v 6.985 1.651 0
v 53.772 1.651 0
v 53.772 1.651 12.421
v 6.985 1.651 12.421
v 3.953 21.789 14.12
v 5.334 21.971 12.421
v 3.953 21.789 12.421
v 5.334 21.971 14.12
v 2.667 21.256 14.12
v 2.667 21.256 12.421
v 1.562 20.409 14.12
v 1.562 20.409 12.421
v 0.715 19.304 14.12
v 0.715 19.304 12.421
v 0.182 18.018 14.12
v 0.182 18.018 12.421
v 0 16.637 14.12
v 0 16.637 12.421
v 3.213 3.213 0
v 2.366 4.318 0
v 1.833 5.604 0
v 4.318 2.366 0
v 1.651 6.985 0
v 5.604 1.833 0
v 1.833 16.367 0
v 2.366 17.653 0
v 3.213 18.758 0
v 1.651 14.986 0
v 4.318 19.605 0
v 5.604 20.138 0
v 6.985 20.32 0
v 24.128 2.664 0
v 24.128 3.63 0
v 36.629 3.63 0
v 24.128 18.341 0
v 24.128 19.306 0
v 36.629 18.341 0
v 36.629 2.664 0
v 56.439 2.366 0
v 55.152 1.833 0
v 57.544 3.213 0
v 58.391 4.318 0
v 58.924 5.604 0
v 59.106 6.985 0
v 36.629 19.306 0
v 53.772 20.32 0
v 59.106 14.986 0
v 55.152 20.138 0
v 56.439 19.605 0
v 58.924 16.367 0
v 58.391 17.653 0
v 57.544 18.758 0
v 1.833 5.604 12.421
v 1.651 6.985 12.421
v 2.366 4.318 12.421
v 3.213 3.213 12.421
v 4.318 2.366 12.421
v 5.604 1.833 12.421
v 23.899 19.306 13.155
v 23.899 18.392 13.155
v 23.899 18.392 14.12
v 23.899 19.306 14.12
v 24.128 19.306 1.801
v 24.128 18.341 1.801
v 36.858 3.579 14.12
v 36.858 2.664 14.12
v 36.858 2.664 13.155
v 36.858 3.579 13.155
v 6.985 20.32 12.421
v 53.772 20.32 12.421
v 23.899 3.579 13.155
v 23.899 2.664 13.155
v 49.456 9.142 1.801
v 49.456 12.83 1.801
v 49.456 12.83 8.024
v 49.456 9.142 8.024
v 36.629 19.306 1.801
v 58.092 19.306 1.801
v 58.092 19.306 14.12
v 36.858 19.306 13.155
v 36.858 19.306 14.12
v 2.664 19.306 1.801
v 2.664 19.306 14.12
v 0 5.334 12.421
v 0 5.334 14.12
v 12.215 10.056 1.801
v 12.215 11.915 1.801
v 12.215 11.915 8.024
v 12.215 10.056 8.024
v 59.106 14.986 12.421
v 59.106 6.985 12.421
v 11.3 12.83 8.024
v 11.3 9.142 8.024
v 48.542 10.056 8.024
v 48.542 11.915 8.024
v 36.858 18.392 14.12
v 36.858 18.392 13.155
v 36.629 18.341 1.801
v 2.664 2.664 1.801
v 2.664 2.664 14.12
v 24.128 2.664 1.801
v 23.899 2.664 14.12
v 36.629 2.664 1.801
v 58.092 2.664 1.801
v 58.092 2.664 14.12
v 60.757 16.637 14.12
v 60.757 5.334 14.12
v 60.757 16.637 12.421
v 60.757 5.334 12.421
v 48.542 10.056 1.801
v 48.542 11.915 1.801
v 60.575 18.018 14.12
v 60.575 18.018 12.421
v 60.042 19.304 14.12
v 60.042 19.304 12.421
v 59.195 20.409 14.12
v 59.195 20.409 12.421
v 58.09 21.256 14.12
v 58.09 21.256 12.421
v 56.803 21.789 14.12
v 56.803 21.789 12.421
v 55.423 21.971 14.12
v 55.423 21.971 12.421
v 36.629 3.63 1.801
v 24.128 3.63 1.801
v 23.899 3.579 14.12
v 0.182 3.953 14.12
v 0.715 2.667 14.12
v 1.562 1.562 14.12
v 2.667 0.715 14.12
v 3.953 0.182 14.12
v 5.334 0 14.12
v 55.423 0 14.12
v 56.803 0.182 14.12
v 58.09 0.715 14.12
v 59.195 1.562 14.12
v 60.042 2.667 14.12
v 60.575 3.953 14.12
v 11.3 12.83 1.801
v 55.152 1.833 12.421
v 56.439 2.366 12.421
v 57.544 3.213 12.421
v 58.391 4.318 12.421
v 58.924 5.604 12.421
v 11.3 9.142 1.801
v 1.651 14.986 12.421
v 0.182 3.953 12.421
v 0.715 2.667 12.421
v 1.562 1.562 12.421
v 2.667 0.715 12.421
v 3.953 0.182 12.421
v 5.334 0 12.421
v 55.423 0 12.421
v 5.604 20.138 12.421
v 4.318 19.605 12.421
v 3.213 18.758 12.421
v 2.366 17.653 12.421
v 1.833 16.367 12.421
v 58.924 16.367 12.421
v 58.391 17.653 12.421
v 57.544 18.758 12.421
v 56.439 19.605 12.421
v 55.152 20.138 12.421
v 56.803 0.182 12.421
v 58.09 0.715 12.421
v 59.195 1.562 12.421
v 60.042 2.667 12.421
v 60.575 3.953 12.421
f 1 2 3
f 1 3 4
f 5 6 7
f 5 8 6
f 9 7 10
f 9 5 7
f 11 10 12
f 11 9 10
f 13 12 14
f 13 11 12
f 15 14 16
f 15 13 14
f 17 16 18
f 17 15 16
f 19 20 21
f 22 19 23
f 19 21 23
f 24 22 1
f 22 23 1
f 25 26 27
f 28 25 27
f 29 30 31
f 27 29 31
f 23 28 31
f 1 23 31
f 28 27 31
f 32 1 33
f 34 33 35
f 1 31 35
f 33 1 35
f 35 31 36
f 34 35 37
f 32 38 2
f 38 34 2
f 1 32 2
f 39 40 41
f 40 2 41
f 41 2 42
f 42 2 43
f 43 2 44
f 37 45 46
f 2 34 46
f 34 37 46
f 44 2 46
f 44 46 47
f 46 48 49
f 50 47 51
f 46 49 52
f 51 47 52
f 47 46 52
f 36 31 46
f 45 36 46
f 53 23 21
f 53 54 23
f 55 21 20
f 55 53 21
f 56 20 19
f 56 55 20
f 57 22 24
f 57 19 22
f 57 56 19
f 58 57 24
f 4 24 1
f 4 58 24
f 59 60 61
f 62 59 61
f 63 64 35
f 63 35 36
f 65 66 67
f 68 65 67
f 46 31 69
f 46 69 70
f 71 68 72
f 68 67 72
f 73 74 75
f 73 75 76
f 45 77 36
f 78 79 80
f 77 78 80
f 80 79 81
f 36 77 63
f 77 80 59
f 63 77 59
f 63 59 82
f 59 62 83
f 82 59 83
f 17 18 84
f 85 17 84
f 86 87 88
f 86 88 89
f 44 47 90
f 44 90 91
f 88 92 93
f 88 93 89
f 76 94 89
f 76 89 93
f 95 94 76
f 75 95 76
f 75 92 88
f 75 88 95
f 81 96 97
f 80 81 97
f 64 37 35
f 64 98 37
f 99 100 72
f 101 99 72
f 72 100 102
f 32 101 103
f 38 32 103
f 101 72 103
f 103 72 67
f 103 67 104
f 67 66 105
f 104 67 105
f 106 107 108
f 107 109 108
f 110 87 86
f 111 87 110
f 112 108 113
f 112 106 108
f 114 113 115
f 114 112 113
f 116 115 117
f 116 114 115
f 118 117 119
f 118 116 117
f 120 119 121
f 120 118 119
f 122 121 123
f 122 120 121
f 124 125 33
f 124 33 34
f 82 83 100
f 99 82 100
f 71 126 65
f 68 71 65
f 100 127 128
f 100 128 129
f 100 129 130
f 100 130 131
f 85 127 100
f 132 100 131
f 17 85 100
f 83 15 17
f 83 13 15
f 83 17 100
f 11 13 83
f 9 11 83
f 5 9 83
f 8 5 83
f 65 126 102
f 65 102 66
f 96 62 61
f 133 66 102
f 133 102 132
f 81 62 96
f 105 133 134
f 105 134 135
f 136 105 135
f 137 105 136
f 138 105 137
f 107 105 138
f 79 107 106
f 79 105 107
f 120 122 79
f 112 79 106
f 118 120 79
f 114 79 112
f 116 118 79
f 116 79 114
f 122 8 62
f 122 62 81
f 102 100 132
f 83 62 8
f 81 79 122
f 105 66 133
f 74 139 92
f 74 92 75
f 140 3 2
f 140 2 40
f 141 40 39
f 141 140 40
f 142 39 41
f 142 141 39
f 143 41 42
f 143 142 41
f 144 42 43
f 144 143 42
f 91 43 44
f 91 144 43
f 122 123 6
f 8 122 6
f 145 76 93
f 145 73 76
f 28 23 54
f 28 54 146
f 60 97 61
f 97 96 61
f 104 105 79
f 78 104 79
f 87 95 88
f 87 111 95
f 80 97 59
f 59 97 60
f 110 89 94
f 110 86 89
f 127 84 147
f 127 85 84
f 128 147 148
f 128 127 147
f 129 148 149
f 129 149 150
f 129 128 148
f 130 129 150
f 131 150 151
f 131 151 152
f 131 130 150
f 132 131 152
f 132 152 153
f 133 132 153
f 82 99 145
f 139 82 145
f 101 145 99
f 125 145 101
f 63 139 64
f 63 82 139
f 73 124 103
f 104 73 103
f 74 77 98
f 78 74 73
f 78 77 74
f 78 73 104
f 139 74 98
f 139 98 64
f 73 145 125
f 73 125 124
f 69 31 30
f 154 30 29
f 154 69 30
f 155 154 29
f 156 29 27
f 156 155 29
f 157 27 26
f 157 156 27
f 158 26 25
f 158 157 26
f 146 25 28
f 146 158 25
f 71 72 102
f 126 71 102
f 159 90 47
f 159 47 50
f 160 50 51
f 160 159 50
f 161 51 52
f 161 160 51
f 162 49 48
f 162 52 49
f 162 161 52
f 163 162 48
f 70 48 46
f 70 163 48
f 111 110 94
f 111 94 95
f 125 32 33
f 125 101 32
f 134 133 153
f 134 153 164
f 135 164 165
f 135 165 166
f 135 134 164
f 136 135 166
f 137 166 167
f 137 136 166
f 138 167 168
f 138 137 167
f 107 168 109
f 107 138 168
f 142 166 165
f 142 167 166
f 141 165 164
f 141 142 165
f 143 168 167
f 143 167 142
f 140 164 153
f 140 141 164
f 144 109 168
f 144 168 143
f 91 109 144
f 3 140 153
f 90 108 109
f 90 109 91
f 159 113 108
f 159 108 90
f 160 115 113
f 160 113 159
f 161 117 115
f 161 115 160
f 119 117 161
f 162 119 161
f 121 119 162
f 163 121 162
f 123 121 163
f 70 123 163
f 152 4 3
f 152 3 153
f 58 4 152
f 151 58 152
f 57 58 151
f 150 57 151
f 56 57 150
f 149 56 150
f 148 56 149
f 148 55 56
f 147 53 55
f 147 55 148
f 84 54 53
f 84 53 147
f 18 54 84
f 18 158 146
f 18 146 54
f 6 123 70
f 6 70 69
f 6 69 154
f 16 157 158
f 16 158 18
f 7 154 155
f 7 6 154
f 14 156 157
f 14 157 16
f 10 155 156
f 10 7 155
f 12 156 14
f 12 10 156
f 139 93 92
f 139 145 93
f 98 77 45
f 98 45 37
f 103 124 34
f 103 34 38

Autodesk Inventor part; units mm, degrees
ref_plane "YZ Plane" through (0, 0, 0) normal (1, 0, 0) x (0, 1, 0)
ref_plane "XZ Plane" through (0, 0, 0) normal (0, 1, 0) x (-1, 0, 0)
ref_plane "XY Plane" through (0, 0, 0) normal (0, 0, 1) x (1, 0, 0)
sketch "Sketch1" plane through (0, 0, 0) normal (0, 0, 1) x (1, 0, 0)
  line L0 (0, 0) -> (60.7568, 0)
  line L1 (60.7568, 0) -> (60.7568, 21.971)
  line L2 (60.7568, 21.971) -> (0, 21.971)
  line L3 (0, 21.971) -> (0, 0)
  dimension "d0" = 60.7568
  dimension "d1" = 21.971
extrude "Extrusion1" add sketch "Sketch1" along normal blind 14.1199
sketch "Sketch2" plane through (0, 0, 14.1199) normal (0, 0, 1) x (1, 0, 0)
  line L0 (0, 21.971) -> (60.7568, 21.971) construction
  line L1 (60.7568, 21.971) -> (60.7568, 0) construction
  line L2 (60.7568, 0) -> (0, 0) construction
  line L3 (0, 0) -> (0, 21.971) construction
  line L4 (58.0923, 19.3065) -> (2.6645, 19.3065)
  line L5 (2.6645, 19.3065) -> (2.6645, 2.6645)
  line L6 (2.6645, 2.6645) -> (58.0923, 2.6645)
  line L7 (58.0923, 2.6645) -> (58.0923, 19.3065)
  point P0 (0, 0)
  dimension "d4" = 2.6645
extrude "Extrusion2" cut sketch "Sketch2" against normal blind 12.319
sketch "Sketch3" plane through (0, 0, 0) normal (0, 0, -1) x (-1, 0, 0)
  line L0 (-60.7568, 21.971) -> (0, 21.971)
  line L1 (0, 21.971) -> (0, 0)
  line L2 (0, 0) -> (-60.7568, 0)
  line L3 (-60.7568, 0) -> (-60.7568, 21.971)
  line L4 (-1.651, 20.32) -> (-59.1058, 20.32)
  line L5 (-59.1058, 20.32) -> (-59.1058, 1.651)
  line L6 (-59.1058, 1.651) -> (-1.651, 1.651)
  line L7 (-1.651, 1.651) -> (-1.651, 20.32)
  dimension "d7" = 1.651
extrude "Extrusion3" cut sketch "Sketch3" against normal blind 12.4206
fillet "Fillet1" radius 5.334 8 edges at (0, 21.971, 13.2702) (60.7568, 21.971, 13.2702) (60.7568, 0, 13.2702) (0, 0, 13.2702) (1.651, 20.32, 6.2103) (59.1058, 20.32, 6.2103) (59.1058, 1.651, 6.2103) (1.651, 1.651, 6.2103)
sketch "Sketch4" plane through (0, 0, 1.8009) normal (0, 0, 1) x (1, 0, 0)
  line L0 (11.3005, 12.8295) -> (49.4563, 12.8295)
  line L1 (49.4563, 12.8295) -> (49.4563, 9.1415)
  line L2 (49.4563, 9.1415) -> (11.3005, 9.1415)
  line L3 (11.3005, 9.1415) -> (11.3005, 12.8295)
  line L4 (2.6645, 2.6645) -> (2.6645, 19.3065) projected
  line L5 (58.0923, 19.3065) -> (58.0923, 2.6645) projected
  line L6 (2.6645, 19.3065) -> (58.0923, 19.3065) projected
  line L7 (58.0923, 2.6645) -> (2.6645, 2.6645) projected
  line L8 (48.5419, 11.9151) -> (12.2149, 11.9151)
  line L9 (12.2149, 11.9151) -> (12.2149, 10.0559)
  line L10 (12.2149, 10.0559) -> (48.5419, 10.0559)
  line L11 (48.5419, 10.0559) -> (48.5419, 11.9151)
  point P0 (0, 0)
  dimension "d12" = 8.636
  dimension "d13" = 8.636
  dimension "d14" = 6.477
  dimension "d15" = 6.477
  dimension "d16" = 0.9144
extrude "Extrusion4" add sketch "Sketch4" along normal blind 6.223 contours L0 L1 L2 L3
sketch "Sketch5" plane through (0, 0, 1.8009) normal (0, 0, 1) x (1, 0, 0)
  line L0 (58.0923, 2.6645) -> (2.6645, 2.6645) projected
  line L1 (24.1275, 3.6297) -> (36.6293, 3.6297)
  line L2 (36.6293, 3.6297) -> (36.6293, 2.6645)
  line L3 (36.6293, 2.6645) -> (24.1275, 2.6645)
  line L4 (24.1275, 2.6645) -> (24.1275, 3.6297)
  line L5 (2.6645, 19.3065) -> (58.0923, 19.3065) projected
  line L6 (24.1275, 19.3065) -> (36.6293, 19.3065)
  line L7 (36.6293, 19.3065) -> (36.6293, 18.3413)
  line L8 (36.6293, 18.3413) -> (24.1275, 18.3413)
  line L9 (24.1275, 18.3413) -> (24.1275, 19.3065)
  line L10 (2.6645, 2.6645) -> (2.6645, 19.3065) projected
  line L11 (58.0923, 19.3065) -> (58.0923, 2.6645) projected
  point P0 (0, 0)
  dimension "d19" = 21.463
  dimension "d20" = 21.463
  dimension "d21" = 21.463
  dimension "d22" = 21.463
  dimension "d23" = 0.9652
  dimension "d24" = 0.9652
extrude "Extrusion5" cut sketch "Sketch5" against normal blind 6.223 contours L0 L4 L1 L2 | L7 L8 L9 L5
sketch "Sketch6" plane through (2.6645, 2.6645, 14.1199) normal (0, 1, 0) x (1, 0, 0)
  line L0 (55.4279, 0) -> (0, 0) construction
  line L1 (21.2344, 0) -> (34.1935, 0)
  line L2 (34.1935, 0) -> (34.1935, 0.9652)
  line L3 (34.1935, 0.9652) -> (21.2344, 0.9652)
  line L4 (21.2344, 0.9652) -> (21.2344, 0)
  line L5 (0, 0) -> (0, 12.319) construction
  line L6 (55.4279, 0) -> (55.4279, 12.319) construction
  point P0 (-2.6645, 14.1199)
  dimension "d27" = 21.2344
  dimension "d28" = 21.2344
  dimension "d29" = 0.9652
extrude "Extrusion6" add sketch "Sketch6" along normal up to next
sketch "Sketch7" plane through (0, 0, 14.1199) normal (0, 0, 1) x (1, 0, 0)
  line L0 (23.8989, 2.6645) -> (23.8989, 19.3065) projected
  line L1 (36.8579, 2.6645) -> (36.8579, 19.3065) projected
  line L2 (23.8989, 3.5789) -> (36.8579, 3.5789)
  line L3 (36.8579, 3.5789) -> (36.8579, 18.3921)
  line L4 (36.8579, 18.3921) -> (23.8989, 18.3921)
  line L5 (23.8989, 18.3921) -> (23.8989, 3.5789)
  line L6 (36.8579, 19.3065) -> (58.0923, 19.3065) projected
  line L7 (58.0923, 2.6645) -> (36.8579, 2.6645) projected
  point P0 (0, 0)
  dimension "d32" = 0.9144
  dimension "d33" = 0.9144
extrude "Extrusion7" cut sketch "Sketch7" against normal up to next
equation "\"d13\" = d12"
equation "\"d15\" = d14"
equation "\"d20\" = d19"
equation "\"d21\" = d19"
equation "\"d22\" = d20"
equation "\"d24\" = d23"
equation "\"d28\" = d27"
equation "\"d33\" = d32"
properties part number "Socket(ellipse Insert)"
